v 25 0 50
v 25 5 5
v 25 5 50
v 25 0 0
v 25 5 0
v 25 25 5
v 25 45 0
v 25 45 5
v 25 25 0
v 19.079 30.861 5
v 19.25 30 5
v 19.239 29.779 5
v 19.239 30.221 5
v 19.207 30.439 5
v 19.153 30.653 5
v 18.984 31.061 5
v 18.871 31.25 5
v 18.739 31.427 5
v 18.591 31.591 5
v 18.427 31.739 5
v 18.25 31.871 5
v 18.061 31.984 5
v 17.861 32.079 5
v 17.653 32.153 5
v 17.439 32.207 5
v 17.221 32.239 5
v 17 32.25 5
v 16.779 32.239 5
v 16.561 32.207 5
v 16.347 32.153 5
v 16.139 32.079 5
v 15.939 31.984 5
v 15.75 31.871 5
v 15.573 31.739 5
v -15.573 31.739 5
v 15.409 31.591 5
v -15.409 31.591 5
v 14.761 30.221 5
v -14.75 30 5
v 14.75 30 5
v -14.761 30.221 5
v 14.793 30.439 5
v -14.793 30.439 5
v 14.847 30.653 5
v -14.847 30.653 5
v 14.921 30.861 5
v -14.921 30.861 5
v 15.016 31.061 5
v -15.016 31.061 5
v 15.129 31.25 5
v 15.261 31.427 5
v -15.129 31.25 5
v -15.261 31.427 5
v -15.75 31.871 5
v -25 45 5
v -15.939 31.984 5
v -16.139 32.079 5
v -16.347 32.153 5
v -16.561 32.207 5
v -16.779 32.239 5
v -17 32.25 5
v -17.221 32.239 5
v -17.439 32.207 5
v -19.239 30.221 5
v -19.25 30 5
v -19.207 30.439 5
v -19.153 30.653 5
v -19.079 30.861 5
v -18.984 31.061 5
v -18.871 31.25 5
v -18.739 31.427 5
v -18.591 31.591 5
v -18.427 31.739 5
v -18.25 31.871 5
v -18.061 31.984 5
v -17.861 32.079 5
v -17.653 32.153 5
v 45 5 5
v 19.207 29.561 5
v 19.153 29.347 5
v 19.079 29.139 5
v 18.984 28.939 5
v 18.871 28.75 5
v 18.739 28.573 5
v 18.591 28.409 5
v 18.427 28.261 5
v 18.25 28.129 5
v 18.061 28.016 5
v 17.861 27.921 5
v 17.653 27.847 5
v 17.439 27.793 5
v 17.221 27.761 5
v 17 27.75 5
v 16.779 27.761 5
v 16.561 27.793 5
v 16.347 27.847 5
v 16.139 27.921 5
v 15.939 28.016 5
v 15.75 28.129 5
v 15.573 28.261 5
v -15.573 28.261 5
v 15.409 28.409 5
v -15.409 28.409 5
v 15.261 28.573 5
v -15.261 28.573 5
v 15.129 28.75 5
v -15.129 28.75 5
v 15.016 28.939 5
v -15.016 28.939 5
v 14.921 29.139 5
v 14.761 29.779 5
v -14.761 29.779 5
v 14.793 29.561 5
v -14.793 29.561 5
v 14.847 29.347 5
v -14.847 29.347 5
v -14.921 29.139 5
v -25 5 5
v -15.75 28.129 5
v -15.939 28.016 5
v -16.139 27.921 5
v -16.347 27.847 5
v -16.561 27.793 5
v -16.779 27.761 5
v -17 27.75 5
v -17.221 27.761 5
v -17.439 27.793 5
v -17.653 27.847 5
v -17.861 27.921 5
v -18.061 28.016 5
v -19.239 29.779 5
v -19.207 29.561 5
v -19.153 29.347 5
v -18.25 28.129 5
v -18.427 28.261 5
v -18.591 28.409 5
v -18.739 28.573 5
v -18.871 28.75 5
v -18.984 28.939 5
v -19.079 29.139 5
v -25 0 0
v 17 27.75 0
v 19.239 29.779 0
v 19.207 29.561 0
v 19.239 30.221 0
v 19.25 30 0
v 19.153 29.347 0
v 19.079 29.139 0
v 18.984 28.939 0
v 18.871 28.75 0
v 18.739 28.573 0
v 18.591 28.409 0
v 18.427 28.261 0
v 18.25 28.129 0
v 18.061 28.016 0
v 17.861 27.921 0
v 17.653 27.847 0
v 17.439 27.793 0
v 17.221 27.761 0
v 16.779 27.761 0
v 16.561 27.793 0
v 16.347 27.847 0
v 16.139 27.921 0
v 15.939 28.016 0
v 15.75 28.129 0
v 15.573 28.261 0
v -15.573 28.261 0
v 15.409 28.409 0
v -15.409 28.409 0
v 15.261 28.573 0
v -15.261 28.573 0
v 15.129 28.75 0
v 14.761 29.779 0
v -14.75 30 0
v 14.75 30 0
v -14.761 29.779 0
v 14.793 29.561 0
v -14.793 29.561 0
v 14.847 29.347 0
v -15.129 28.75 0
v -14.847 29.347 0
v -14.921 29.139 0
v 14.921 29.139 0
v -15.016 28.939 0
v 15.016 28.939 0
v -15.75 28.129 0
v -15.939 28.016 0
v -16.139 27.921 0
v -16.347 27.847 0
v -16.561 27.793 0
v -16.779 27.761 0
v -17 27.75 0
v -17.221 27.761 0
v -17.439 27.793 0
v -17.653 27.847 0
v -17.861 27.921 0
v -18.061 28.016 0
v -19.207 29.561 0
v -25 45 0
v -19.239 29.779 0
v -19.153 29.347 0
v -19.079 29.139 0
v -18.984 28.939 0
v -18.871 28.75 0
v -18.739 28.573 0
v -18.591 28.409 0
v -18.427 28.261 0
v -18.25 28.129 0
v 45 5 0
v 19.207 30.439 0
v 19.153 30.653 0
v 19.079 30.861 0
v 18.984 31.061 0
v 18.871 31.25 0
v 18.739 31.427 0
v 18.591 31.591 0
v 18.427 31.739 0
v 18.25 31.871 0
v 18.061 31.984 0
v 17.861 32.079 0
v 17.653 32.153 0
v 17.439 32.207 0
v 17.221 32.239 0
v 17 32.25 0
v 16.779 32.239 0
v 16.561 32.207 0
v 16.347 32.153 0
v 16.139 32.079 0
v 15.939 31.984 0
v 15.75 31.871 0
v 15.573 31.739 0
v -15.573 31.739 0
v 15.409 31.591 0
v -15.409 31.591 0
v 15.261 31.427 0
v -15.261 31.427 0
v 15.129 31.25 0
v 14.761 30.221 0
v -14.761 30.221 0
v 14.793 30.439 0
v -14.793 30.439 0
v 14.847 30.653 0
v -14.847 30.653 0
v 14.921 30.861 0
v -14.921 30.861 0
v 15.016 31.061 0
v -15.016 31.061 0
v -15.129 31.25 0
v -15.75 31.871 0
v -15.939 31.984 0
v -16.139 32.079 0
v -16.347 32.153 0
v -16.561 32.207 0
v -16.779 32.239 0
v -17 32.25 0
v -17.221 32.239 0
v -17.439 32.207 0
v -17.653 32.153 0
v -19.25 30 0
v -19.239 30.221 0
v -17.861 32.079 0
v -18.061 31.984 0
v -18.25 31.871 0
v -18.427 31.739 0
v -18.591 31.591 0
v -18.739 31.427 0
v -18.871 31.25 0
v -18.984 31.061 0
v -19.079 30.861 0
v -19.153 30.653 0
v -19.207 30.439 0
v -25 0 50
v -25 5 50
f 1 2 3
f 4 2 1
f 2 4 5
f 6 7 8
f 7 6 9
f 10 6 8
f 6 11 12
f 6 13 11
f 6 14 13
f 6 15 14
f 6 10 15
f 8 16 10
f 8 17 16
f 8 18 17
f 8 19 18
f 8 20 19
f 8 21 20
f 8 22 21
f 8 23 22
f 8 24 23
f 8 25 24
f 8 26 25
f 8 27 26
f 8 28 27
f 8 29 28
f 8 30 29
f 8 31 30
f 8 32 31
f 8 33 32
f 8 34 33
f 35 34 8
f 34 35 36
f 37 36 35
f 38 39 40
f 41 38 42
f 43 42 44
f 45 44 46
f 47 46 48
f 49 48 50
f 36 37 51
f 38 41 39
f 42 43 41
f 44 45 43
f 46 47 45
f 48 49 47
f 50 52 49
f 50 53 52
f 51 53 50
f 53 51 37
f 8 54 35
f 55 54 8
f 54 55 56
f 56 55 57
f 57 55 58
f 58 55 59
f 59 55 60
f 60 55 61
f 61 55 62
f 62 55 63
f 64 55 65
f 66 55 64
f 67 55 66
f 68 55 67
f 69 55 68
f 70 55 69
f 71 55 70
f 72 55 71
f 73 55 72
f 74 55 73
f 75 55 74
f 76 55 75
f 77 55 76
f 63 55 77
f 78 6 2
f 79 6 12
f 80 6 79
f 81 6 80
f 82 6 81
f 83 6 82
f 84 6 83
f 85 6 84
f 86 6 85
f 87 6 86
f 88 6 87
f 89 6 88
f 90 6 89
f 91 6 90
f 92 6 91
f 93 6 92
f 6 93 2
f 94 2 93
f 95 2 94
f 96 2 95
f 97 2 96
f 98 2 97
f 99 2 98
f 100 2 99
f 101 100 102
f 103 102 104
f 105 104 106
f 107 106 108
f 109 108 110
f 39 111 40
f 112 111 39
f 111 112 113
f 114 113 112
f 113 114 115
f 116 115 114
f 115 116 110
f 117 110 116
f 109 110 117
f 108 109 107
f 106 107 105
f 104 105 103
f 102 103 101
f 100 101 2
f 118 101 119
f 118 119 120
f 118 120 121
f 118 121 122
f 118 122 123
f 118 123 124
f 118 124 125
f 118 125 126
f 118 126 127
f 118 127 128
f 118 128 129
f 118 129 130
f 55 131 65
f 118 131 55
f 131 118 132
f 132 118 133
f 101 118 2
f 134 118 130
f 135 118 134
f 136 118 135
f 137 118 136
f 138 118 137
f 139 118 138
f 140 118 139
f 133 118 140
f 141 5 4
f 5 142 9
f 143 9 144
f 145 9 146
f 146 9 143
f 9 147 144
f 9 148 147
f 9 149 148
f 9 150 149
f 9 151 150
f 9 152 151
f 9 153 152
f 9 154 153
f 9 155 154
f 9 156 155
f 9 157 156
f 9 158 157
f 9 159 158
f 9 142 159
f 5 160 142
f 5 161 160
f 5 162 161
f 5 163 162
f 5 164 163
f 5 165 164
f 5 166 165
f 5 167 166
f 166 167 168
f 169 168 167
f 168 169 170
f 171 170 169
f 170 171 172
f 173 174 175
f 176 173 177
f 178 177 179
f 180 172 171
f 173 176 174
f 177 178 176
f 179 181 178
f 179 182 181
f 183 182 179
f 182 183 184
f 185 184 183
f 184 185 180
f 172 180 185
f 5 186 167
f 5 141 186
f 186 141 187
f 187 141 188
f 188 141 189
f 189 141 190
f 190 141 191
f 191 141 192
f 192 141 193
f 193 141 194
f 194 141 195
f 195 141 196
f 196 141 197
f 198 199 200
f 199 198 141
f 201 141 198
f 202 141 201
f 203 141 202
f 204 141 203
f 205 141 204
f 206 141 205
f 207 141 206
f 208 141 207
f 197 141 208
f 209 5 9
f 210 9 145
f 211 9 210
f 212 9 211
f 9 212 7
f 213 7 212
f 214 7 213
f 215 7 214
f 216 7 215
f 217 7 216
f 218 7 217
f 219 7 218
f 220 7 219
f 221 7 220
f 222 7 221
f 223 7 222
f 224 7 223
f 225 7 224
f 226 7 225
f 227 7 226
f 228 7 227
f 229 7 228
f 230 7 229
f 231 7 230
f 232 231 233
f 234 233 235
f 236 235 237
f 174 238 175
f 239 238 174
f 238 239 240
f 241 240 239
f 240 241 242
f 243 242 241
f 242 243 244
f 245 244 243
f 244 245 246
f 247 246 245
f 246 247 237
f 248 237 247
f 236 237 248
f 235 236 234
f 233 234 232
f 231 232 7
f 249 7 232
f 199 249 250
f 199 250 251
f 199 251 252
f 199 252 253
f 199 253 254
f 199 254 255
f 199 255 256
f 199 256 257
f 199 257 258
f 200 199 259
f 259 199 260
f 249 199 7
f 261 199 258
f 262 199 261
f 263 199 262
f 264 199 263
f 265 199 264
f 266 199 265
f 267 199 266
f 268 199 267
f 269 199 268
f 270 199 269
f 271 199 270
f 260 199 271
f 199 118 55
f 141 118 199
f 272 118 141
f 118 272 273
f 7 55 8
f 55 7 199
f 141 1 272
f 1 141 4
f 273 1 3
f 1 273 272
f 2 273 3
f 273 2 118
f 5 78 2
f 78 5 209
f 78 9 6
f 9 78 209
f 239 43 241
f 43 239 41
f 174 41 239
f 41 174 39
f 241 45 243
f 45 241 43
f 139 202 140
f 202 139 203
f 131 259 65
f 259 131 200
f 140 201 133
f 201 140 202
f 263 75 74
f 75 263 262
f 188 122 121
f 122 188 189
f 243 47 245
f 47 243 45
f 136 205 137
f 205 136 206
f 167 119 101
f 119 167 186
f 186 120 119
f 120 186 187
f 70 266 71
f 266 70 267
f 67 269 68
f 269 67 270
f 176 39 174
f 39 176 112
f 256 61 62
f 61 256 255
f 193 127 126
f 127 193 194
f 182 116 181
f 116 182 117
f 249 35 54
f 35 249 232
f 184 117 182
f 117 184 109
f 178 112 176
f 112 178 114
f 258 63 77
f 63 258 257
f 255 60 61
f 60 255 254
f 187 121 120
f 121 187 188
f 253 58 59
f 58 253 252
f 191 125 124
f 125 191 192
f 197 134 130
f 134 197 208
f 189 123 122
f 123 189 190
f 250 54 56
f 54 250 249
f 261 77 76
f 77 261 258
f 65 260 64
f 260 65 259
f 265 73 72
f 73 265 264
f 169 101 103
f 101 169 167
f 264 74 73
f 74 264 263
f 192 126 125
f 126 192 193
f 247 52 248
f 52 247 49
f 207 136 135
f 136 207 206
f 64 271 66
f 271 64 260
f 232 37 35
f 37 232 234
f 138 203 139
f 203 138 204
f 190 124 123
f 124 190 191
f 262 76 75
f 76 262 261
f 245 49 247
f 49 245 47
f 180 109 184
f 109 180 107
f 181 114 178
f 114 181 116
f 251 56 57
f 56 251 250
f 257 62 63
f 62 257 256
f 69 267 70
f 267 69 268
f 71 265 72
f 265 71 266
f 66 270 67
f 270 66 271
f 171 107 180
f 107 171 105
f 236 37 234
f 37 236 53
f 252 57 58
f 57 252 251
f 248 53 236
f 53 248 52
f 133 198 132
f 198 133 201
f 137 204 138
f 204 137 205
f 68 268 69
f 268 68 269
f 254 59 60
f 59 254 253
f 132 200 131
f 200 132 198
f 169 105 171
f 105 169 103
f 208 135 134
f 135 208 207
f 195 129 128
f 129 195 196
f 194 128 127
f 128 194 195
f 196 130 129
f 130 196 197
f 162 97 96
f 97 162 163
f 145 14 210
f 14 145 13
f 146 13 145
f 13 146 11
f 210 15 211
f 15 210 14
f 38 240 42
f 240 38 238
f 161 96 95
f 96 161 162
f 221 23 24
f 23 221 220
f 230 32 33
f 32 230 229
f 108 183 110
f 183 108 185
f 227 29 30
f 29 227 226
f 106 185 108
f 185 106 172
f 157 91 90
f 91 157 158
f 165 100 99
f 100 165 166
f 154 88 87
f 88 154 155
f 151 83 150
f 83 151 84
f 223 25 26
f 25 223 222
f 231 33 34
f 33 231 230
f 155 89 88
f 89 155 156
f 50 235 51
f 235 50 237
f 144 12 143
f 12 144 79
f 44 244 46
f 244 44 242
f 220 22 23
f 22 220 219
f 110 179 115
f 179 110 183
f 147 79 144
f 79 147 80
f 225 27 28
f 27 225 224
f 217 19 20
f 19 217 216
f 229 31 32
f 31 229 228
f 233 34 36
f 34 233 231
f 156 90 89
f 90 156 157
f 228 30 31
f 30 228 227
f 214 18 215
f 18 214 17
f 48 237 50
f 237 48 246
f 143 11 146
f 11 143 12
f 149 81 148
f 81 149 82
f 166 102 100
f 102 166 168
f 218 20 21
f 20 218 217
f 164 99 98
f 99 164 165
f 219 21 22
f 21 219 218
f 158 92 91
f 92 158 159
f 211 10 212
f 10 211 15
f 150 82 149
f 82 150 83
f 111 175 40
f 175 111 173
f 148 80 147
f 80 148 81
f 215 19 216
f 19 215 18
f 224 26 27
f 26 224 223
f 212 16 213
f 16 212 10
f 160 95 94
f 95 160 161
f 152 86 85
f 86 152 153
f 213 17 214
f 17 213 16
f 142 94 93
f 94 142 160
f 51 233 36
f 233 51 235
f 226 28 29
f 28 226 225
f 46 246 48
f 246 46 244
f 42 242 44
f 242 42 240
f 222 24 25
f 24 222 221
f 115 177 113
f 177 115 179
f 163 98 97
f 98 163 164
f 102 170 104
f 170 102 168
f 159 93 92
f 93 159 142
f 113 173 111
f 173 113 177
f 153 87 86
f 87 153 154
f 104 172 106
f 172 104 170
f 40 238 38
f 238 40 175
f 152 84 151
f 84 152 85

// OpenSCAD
// NEMA 17 L-shaped mounting bracket
// Print orientation: base plate on XY plane (z=0), builds upward (+Z)

$fn = 64;

// Base plate dimensions
base_x_min = -25;
base_x_max = 25;
base_y_min = 0;
base_y_max = 45;
base_z_min = 0;
base_z_max = 5;

// M4 through-holes in base plate
m4_hole_d = 4.5;
m4_hole_x1 = -17;
m4_hole_y1 = 30;
m4_hole_x2 = 17;
m4_hole_y2 = 30;

// Vertical motor plate dimensions
motor_x_min = -25;
motor_x_max = 25;
motor_y_min = 0;
motor_y_max = 5;
motor_z_min = 0;
motor_z_max = 50;

// Motor centring boss hole
boss_hole_d = 23;
boss_hole_x = 0;
boss_hole_z = 28;

// M3 screw holes on 31 mm square pattern
m3_hole_d = 3.4;
m3_square = 31;
m3_offset = m3_square / 2;  // 15.5 mm from centre

// Gusset dimensions
gusset_thick = 5;
gusset_leg_y = 20;
gusset_leg_z = 20;
gusset_y_corner = 5;   // right-angle corner y position
gusset_z_corner = 5;   // right-angle corner z position

// Left gusset x range
gusset_left_x_min = -25;
gusset_left_x_max = -20;

// Right gusset x range
gusset_right_x_min = 20;
gusset_right_x_max = 25;

// Helper: triangular gusset in YZ plane, extruded along X
// Right angle at (y_corner, z_corner), legs along +Y and +Z
module gusset(x_min, x_max) {
    translate([x_min, 0, 0]) {
        linear_extrude(x_max - x_min) {
            polygon(points = [
                [gusset_y_corner, gusset_z_corner],
                [gusset_y_corner + gusset_leg_y, gusset_z_corner],
                [gusset_y_corner, gusset_z_corner + gusset_leg_z]
            ]);
        }
    }
}

// Helper: vertical through-hole in motor plate (along Y axis)
module motor_plate_hole(cx, cz, d) {
    translate([cx, -1, cz]) {
        rotate([90, 0, 0]) {
            cylinder(h = motor_y_max - motor_y_min + 2, d = d, $fn = $fn);
        }
    }
}

// Helper: vertical through-hole in base plate (along Z axis)
module base_plate_hole(cx, cy, d) {
    translate([cx, cy, -1]) {
        cylinder(h = base_z_max - base_z_min + 2, d = d, $fn = $fn);
    }
}

difference() {
    union() {
        // Base plate
        translate([base_x_min, base_y_min, base_z_min]) {
            cube([base_x_max - base_x_min, base_y_max - base_y_min, base_z_max - base_z_min]);
        }

        // Vertical motor plate
        translate([motor_x_min, motor_y_min, motor_z_min]) {
            cube([motor_x_max - motor_x_min, motor_y_max - motor_y_min, motor_z_max - motor_z_min]);
        }

        // Left gusset
        gusset(gusset_left_x_min, gusset_left_x_max);

        // Right gusset
        gusset(gusset_right_x_min, gusset_right_x_max);
    }

    // M4 holes in base plate
    base_plate_hole(m4_hole_x1, m4_hole_y1, m4_hole_d);
    base_plate_hole(m4_hole_x2, m4_hole_y2, m4_hole_d);

    // Boss hole in motor plate
    motor_plate_hole(boss_hole_x, boss_hole_z, boss_hole_d);

    // M3 screw holes in motor plate (31 mm square pattern)
    for (dx = [-m3_offset, m3_offset]) {
        for (dz = [-m3_offset, m3_offset]) {
            motor_plate_hole(boss_hole_x + dx, boss_hole_z + dz, m3_hole_d);
        }
    }
}
